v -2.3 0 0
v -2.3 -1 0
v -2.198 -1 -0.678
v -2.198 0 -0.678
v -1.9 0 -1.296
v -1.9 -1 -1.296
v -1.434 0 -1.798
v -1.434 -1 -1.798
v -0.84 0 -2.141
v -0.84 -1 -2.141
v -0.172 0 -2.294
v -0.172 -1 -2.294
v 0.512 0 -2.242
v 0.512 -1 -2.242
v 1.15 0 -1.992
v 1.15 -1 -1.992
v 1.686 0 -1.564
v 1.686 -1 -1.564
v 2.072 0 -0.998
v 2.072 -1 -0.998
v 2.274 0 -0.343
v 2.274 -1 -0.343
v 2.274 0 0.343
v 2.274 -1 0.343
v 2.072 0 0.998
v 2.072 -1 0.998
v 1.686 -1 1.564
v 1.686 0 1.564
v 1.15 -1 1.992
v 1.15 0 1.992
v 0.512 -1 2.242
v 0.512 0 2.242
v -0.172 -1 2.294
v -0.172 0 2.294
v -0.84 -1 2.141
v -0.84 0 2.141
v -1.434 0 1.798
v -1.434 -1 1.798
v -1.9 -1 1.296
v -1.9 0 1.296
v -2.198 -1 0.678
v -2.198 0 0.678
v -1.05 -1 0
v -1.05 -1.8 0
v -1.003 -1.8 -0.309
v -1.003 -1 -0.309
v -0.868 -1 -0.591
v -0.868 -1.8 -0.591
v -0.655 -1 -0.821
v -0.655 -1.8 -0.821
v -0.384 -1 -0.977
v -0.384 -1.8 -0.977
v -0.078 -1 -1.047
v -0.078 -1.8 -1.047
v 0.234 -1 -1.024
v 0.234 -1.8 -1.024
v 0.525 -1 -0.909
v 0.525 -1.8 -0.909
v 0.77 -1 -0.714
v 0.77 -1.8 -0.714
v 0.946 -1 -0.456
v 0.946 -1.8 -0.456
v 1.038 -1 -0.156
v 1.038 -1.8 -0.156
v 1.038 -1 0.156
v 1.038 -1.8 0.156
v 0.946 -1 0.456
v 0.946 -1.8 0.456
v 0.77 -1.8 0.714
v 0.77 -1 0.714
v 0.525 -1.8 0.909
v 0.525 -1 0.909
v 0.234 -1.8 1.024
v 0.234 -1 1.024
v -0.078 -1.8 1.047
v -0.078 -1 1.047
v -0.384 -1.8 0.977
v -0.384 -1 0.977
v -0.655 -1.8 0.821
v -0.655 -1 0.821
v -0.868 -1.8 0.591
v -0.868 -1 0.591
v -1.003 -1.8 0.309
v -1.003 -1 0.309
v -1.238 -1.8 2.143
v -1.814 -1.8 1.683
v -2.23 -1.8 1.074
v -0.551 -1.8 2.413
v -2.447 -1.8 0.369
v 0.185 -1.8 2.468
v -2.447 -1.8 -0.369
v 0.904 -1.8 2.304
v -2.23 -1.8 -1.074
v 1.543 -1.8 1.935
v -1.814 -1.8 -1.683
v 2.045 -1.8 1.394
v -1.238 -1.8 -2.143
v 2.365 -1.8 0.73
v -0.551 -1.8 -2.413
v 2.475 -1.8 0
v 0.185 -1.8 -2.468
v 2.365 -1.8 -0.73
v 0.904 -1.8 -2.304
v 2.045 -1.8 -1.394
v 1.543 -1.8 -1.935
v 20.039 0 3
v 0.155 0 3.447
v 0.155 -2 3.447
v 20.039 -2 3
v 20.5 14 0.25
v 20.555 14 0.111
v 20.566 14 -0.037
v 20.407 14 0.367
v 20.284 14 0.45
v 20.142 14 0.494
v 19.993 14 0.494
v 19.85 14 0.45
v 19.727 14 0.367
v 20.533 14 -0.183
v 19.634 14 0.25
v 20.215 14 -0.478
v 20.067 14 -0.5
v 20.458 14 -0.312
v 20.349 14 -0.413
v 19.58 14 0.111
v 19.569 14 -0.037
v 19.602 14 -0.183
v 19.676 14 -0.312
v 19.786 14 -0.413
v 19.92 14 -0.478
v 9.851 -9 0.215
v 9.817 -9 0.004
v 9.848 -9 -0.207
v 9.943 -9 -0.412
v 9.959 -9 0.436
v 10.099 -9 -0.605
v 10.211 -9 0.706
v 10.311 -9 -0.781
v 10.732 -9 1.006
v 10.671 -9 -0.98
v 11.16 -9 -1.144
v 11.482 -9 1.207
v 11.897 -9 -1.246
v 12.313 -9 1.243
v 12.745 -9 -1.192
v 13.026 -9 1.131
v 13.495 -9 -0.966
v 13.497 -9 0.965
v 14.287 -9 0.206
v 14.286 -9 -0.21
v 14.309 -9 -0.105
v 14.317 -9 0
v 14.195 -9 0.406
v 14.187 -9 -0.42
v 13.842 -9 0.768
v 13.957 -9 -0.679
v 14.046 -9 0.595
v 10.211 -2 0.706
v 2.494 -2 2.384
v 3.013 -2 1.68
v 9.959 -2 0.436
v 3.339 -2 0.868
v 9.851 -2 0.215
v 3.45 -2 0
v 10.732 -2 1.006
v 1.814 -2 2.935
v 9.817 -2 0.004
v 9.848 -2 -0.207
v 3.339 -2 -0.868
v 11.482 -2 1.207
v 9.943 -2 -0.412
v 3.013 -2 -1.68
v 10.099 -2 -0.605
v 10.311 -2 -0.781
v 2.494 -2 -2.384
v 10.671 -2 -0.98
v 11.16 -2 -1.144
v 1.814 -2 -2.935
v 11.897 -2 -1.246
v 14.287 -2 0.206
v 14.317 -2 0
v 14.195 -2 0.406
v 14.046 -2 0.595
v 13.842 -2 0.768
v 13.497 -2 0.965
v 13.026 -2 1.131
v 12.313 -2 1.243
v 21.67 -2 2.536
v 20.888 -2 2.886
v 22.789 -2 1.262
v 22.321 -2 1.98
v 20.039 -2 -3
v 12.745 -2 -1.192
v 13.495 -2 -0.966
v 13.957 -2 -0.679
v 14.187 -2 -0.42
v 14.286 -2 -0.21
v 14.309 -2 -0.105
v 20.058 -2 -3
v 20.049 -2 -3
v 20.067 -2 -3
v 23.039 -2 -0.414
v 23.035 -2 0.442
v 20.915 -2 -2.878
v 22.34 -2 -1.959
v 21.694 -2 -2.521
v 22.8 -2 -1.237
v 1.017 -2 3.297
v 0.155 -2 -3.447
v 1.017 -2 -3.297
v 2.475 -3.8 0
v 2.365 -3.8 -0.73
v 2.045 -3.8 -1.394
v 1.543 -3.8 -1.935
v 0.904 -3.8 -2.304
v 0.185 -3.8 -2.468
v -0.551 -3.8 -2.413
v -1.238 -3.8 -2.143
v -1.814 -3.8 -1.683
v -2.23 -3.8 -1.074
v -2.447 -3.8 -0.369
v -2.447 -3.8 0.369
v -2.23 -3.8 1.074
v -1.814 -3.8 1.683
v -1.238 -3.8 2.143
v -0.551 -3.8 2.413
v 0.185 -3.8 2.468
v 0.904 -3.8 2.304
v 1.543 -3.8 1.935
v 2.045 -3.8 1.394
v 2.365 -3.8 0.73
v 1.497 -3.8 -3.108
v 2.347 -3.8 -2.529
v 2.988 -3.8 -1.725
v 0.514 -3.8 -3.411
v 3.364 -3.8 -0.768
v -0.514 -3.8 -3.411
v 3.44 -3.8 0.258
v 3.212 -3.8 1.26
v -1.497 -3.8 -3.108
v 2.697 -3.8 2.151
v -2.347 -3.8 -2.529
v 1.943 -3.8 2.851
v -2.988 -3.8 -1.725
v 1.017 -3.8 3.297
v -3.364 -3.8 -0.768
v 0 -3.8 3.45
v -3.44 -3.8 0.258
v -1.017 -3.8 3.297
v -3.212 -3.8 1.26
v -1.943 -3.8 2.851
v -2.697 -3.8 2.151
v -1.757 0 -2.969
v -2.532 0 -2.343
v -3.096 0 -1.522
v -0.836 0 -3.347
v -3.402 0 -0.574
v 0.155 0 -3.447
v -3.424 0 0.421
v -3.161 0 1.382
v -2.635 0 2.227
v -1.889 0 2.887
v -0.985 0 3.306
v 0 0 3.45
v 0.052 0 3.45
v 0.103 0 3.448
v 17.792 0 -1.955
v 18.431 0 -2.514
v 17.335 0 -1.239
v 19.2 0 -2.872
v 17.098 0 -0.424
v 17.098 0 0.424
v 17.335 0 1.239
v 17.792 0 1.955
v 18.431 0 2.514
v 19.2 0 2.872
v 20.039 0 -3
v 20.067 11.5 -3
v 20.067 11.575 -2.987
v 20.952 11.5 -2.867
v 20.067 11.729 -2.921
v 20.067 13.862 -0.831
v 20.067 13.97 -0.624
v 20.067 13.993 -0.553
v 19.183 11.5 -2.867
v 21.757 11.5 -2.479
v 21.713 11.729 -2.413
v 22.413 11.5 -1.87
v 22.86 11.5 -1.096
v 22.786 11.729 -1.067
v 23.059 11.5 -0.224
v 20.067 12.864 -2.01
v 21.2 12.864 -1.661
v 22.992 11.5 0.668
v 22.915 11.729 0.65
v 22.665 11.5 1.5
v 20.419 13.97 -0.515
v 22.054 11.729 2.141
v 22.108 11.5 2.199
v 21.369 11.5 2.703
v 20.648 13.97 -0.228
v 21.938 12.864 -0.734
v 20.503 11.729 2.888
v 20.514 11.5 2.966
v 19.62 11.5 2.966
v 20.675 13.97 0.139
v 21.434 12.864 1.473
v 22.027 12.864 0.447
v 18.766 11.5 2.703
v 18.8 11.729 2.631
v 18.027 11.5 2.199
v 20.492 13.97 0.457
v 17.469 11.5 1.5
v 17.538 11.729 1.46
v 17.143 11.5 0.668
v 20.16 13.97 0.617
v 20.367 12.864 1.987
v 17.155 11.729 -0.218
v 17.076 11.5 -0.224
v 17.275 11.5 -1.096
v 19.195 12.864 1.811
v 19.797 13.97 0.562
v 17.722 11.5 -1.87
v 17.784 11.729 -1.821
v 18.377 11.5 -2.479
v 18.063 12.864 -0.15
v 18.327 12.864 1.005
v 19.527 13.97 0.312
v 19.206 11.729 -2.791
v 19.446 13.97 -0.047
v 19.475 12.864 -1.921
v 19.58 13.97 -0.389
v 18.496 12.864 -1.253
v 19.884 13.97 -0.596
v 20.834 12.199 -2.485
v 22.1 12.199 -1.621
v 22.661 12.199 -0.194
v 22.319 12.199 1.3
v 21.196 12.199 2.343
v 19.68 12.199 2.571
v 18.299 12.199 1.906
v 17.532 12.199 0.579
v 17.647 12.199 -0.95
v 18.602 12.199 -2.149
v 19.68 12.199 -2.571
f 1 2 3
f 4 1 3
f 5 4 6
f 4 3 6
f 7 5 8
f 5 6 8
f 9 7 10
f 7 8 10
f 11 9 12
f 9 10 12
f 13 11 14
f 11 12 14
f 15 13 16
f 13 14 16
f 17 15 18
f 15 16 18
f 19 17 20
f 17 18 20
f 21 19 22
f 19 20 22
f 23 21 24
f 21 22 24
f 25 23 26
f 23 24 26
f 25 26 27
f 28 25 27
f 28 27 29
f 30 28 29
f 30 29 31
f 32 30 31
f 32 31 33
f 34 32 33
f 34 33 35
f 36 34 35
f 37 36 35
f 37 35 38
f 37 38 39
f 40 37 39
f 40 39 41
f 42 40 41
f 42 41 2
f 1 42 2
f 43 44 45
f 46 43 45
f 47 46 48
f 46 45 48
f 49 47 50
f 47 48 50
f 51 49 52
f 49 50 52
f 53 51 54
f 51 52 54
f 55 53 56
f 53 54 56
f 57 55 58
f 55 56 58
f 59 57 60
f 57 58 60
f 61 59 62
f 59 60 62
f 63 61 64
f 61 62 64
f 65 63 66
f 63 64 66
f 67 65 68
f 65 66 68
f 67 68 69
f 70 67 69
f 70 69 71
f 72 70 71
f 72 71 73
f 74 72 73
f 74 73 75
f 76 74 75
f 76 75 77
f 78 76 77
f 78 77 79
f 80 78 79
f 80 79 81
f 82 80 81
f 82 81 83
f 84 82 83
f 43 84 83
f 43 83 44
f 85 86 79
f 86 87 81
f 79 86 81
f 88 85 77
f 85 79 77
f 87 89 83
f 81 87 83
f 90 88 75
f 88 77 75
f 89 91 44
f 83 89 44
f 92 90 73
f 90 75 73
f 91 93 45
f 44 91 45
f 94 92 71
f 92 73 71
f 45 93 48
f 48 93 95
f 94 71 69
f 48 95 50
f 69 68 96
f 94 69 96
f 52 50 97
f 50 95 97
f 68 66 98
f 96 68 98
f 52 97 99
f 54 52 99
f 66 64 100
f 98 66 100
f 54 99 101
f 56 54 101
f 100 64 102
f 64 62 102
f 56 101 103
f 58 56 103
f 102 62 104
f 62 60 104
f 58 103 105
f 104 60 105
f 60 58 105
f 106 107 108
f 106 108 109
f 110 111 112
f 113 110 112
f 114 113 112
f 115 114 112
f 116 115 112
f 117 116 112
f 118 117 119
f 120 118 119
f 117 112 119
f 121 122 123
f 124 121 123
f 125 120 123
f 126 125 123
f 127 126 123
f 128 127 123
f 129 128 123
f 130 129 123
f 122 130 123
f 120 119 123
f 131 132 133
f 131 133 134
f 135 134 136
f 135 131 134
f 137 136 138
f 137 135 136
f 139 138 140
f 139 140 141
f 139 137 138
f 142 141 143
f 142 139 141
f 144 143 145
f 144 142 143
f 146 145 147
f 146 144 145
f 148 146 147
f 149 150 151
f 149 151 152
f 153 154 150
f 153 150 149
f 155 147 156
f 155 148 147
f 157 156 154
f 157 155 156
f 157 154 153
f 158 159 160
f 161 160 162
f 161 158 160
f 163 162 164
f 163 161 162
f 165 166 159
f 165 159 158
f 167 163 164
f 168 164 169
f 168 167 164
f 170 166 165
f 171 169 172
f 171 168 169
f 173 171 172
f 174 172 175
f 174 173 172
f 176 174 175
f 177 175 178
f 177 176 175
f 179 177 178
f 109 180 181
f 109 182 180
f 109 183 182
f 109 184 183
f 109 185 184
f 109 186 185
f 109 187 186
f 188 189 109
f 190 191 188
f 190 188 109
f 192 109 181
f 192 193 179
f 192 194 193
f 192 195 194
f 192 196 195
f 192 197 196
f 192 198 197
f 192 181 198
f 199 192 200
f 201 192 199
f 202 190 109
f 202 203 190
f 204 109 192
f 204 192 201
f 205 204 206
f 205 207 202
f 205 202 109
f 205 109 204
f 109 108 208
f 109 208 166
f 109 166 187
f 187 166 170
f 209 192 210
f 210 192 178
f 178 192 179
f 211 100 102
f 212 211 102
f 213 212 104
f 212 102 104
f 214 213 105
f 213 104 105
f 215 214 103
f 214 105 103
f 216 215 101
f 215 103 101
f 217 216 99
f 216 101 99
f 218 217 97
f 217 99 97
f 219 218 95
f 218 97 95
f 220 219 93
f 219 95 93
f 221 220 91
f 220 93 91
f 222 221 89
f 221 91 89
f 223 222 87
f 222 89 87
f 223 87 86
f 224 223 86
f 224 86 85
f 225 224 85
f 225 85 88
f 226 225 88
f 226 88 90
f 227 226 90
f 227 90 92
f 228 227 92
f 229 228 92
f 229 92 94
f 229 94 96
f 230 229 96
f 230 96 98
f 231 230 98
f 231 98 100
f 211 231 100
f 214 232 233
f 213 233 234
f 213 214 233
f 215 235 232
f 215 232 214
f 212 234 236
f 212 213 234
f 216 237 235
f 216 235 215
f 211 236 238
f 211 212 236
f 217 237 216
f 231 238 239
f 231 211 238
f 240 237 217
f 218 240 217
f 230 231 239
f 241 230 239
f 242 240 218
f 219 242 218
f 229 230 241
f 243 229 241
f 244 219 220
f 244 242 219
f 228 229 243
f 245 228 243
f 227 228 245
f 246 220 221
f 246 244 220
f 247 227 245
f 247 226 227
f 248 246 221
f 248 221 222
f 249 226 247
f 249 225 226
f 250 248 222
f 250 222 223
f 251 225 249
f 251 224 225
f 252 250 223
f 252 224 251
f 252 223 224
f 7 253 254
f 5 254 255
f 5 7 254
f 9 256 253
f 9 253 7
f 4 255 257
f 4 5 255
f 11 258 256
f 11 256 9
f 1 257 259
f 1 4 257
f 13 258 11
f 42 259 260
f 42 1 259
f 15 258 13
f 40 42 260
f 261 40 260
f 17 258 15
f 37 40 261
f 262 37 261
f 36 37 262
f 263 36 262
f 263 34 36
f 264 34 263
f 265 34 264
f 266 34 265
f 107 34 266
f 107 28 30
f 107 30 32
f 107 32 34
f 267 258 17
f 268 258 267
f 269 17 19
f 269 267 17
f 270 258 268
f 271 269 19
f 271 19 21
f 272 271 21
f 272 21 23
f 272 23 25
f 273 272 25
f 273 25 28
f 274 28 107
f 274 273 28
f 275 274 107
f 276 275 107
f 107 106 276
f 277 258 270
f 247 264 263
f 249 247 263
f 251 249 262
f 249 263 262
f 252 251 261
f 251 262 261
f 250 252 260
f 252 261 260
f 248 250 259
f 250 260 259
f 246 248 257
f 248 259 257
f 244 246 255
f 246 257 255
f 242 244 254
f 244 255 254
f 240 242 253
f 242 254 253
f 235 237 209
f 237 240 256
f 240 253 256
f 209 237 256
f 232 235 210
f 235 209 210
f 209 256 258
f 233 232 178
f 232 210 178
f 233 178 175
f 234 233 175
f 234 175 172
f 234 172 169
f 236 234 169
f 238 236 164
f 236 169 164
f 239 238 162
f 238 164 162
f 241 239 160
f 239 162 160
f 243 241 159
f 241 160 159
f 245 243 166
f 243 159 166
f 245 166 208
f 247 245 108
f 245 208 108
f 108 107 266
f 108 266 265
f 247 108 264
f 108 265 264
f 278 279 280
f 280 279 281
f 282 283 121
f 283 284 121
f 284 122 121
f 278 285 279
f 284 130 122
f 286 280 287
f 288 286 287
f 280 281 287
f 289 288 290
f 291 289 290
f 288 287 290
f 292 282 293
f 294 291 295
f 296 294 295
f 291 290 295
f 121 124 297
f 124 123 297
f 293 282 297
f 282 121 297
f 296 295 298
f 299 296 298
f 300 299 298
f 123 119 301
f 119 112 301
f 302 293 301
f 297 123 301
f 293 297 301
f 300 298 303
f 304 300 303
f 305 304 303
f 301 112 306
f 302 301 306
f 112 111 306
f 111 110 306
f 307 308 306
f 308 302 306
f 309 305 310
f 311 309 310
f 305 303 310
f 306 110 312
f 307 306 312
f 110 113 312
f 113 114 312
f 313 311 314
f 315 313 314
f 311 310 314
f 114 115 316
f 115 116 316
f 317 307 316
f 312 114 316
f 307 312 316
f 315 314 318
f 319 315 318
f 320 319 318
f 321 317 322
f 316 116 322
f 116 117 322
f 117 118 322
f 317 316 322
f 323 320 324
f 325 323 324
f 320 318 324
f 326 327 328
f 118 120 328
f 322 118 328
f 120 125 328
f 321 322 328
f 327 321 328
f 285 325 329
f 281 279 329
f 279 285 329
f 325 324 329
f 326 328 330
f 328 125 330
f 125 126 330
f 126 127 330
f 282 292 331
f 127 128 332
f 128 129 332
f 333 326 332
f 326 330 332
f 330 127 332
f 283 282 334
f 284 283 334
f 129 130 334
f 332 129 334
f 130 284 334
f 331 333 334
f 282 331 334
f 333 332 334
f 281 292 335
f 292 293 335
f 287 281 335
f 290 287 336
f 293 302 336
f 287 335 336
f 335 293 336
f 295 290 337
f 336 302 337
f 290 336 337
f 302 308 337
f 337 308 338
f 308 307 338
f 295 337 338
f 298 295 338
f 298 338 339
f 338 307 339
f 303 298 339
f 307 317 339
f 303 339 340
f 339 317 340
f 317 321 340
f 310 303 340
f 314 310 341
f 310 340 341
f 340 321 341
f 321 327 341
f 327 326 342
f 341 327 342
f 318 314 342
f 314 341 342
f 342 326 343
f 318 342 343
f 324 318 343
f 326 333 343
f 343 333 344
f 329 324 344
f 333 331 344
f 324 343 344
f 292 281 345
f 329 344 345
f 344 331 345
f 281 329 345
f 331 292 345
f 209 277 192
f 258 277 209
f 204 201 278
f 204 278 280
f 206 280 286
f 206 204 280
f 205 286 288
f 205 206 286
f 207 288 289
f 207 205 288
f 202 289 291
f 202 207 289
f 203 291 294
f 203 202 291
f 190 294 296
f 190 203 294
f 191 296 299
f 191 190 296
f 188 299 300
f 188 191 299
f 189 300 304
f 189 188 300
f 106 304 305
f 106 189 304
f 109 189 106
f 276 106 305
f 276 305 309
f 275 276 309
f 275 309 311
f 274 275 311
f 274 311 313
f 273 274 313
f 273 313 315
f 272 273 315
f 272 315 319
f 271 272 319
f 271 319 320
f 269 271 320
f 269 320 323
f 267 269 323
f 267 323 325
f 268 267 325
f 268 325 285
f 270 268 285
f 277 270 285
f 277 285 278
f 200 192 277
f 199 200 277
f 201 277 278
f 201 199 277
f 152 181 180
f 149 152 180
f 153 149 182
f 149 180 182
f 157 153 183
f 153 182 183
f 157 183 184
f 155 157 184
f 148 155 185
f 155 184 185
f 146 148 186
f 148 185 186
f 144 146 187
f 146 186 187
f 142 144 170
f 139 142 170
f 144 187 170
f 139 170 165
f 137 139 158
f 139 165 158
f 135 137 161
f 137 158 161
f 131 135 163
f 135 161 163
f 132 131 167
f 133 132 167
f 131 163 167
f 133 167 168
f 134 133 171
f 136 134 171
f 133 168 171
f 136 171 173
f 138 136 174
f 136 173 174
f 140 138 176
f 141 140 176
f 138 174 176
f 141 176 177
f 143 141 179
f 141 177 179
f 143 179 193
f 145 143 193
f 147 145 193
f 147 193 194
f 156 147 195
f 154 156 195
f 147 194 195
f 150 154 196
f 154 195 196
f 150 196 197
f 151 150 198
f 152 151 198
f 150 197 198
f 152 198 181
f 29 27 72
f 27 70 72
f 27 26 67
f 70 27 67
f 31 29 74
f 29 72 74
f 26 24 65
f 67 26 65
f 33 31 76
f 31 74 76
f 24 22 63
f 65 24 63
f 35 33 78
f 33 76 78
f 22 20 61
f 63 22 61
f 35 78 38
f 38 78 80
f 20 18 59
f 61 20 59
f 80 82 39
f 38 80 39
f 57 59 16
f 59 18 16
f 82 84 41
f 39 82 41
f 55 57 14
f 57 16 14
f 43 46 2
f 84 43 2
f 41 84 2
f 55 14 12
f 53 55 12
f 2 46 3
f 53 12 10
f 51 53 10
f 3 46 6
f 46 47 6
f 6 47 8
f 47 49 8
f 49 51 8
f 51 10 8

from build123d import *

# Parameters (mm, degrees)
ESBO_O1_R                = 3.45
RESSALTO_EXTRUS_O1_DEPTH = 1.4
ESBO_O2_R                = 3.45
RESSALTO_EXTRUS_O2_DEPTH = 2.4
FURO1_D                  = 4.95
FURO1_DEPTH              = 2
FURO2_D                  = 4.6
FURO2_DEPTH              = 1
FURO3_D                  = 2.1
BOSS_EXTRUDE1_DEPTH      = 2
SKETCH3_R                = 3
BOSS_EXTRUDE2_DEPTH      = 16
SKETCH4_RX               = 2.25
SKETCH4_RY               = 1.25
BOSS_EXTRUDE3_DEPTH      = 7
FILLET3_SIZE             = 2.5


with BuildPart() as part:
    # Esboço1 → Ressalto-extrusão1 (new body)
    with BuildSketch(Plane(origin=(0, 0, 0), x_dir=(1, 0, 0), z_dir=(0, 1, 0))):
        with Locations(Location((0, 0, 0), (0, 0, 270))):
            Circle(ESBO_O1_R)
    extrude(amount=-RESSALTO_EXTRUS_O1_DEPTH)

    # Esboço2 → Ressalto-extrusão2 (add)
    with BuildSketch(Plane.XZ.offset(1.4)):
        with Locations(Location((0, 0, 0), (0, 0, 90))):
            Circle(ESBO_O2_R)
    extrude(amount=RESSALTO_EXTRUS_O2_DEPTH)

    # Furo1
    with Locations(Plane(origin=(0, -3.8, 0), x_dir=(-1, 0, 0), z_dir=(0, -1, 0))):
        with Locations((0, 0)):
            Hole(FURO1_D / 2, depth=FURO1_DEPTH)

    # Furo2
    with Locations(Plane(origin=(0, 0, 0), x_dir=(1, 0, 0), z_dir=(0, 1, 0))):
        with Locations((0, 0)):
            Hole(FURO2_D / 2, depth=FURO2_DEPTH)

    # Furo3 (through all)
    with Locations(Plane(origin=(0, 0, 0), x_dir=(1, 0, 0), z_dir=(0, 1, 0))):
        with Locations((0, 0)):
            Hole(FURO3_D / 2)

    # Sketch2 → Boss-Extrude1 (add)
    with BuildSketch(Plane(origin=(0, 0, 0), x_dir=(1, 0, 0), z_dir=(0, 1, 0))):
        with BuildLine():
            Line((20.067369497, 2.999243463), (0.154910769, 3.446520369))
            ThreePointArc((0.154910769, 3.446520369), (2.493686243, 2.384120157), (3.45, 0))
            ThreePointArc((3.45, 0), (2.493686243, -2.384120157), (0.154910769, -3.446520369))
            Line((0.154910769, -3.446520369), (20.067369497, -2.999243463))
            ThreePointArc((20.067369497, -2.999243463), (23, 0), (20.067369497, 2.999243463))
        make_face()
    extrude(amount=-BOSS_EXTRUDE1_DEPTH)

    # Sketch3 → Boss-Extrude2 (add)
    with BuildSketch(Plane.XZ.offset(2)):
        with Locations(Location((20.067369497, 0, 0), (0, 0, 270))):
            Circle(SKETCH3_R)
    extrude(amount=-BOSS_EXTRUDE2_DEPTH)

    # Sketch4 → Boss-Extrude3 (add)
    with BuildSketch(Plane.XZ.offset(2)):
        with Locations((12.067369497, 0)):
            Ellipse(SKETCH4_RX, SKETCH4_RY)
    extrude(amount=BOSS_EXTRUDE3_DEPTH)

    # Fillet3
    # a fillet whose section is not a circle: 2.5 mm, written as the material it takes off along each edge
    with BuildSketch(Plane(origin=(20.067369497, 14, 0), x_dir=(0, 0, -1), z_dir=(-1, 0, 0))) as fillet3_piece_1:
        with BuildLine():
            Bezier((3, FILLET3_SIZE), (3, 0), (3 - FILLET3_SIZE, 0), weights=[1, 0.176470588, 1])
            Line((3 - FILLET3_SIZE, 0), (3, 0))
            Line((3, 0), (3, FILLET3_SIZE))
        make_face()
    revolve(axis=Axis((20.067369497, 14, 0), (0, -1, 0)), mode=Mode.SUBTRACT)


solid = part.part
